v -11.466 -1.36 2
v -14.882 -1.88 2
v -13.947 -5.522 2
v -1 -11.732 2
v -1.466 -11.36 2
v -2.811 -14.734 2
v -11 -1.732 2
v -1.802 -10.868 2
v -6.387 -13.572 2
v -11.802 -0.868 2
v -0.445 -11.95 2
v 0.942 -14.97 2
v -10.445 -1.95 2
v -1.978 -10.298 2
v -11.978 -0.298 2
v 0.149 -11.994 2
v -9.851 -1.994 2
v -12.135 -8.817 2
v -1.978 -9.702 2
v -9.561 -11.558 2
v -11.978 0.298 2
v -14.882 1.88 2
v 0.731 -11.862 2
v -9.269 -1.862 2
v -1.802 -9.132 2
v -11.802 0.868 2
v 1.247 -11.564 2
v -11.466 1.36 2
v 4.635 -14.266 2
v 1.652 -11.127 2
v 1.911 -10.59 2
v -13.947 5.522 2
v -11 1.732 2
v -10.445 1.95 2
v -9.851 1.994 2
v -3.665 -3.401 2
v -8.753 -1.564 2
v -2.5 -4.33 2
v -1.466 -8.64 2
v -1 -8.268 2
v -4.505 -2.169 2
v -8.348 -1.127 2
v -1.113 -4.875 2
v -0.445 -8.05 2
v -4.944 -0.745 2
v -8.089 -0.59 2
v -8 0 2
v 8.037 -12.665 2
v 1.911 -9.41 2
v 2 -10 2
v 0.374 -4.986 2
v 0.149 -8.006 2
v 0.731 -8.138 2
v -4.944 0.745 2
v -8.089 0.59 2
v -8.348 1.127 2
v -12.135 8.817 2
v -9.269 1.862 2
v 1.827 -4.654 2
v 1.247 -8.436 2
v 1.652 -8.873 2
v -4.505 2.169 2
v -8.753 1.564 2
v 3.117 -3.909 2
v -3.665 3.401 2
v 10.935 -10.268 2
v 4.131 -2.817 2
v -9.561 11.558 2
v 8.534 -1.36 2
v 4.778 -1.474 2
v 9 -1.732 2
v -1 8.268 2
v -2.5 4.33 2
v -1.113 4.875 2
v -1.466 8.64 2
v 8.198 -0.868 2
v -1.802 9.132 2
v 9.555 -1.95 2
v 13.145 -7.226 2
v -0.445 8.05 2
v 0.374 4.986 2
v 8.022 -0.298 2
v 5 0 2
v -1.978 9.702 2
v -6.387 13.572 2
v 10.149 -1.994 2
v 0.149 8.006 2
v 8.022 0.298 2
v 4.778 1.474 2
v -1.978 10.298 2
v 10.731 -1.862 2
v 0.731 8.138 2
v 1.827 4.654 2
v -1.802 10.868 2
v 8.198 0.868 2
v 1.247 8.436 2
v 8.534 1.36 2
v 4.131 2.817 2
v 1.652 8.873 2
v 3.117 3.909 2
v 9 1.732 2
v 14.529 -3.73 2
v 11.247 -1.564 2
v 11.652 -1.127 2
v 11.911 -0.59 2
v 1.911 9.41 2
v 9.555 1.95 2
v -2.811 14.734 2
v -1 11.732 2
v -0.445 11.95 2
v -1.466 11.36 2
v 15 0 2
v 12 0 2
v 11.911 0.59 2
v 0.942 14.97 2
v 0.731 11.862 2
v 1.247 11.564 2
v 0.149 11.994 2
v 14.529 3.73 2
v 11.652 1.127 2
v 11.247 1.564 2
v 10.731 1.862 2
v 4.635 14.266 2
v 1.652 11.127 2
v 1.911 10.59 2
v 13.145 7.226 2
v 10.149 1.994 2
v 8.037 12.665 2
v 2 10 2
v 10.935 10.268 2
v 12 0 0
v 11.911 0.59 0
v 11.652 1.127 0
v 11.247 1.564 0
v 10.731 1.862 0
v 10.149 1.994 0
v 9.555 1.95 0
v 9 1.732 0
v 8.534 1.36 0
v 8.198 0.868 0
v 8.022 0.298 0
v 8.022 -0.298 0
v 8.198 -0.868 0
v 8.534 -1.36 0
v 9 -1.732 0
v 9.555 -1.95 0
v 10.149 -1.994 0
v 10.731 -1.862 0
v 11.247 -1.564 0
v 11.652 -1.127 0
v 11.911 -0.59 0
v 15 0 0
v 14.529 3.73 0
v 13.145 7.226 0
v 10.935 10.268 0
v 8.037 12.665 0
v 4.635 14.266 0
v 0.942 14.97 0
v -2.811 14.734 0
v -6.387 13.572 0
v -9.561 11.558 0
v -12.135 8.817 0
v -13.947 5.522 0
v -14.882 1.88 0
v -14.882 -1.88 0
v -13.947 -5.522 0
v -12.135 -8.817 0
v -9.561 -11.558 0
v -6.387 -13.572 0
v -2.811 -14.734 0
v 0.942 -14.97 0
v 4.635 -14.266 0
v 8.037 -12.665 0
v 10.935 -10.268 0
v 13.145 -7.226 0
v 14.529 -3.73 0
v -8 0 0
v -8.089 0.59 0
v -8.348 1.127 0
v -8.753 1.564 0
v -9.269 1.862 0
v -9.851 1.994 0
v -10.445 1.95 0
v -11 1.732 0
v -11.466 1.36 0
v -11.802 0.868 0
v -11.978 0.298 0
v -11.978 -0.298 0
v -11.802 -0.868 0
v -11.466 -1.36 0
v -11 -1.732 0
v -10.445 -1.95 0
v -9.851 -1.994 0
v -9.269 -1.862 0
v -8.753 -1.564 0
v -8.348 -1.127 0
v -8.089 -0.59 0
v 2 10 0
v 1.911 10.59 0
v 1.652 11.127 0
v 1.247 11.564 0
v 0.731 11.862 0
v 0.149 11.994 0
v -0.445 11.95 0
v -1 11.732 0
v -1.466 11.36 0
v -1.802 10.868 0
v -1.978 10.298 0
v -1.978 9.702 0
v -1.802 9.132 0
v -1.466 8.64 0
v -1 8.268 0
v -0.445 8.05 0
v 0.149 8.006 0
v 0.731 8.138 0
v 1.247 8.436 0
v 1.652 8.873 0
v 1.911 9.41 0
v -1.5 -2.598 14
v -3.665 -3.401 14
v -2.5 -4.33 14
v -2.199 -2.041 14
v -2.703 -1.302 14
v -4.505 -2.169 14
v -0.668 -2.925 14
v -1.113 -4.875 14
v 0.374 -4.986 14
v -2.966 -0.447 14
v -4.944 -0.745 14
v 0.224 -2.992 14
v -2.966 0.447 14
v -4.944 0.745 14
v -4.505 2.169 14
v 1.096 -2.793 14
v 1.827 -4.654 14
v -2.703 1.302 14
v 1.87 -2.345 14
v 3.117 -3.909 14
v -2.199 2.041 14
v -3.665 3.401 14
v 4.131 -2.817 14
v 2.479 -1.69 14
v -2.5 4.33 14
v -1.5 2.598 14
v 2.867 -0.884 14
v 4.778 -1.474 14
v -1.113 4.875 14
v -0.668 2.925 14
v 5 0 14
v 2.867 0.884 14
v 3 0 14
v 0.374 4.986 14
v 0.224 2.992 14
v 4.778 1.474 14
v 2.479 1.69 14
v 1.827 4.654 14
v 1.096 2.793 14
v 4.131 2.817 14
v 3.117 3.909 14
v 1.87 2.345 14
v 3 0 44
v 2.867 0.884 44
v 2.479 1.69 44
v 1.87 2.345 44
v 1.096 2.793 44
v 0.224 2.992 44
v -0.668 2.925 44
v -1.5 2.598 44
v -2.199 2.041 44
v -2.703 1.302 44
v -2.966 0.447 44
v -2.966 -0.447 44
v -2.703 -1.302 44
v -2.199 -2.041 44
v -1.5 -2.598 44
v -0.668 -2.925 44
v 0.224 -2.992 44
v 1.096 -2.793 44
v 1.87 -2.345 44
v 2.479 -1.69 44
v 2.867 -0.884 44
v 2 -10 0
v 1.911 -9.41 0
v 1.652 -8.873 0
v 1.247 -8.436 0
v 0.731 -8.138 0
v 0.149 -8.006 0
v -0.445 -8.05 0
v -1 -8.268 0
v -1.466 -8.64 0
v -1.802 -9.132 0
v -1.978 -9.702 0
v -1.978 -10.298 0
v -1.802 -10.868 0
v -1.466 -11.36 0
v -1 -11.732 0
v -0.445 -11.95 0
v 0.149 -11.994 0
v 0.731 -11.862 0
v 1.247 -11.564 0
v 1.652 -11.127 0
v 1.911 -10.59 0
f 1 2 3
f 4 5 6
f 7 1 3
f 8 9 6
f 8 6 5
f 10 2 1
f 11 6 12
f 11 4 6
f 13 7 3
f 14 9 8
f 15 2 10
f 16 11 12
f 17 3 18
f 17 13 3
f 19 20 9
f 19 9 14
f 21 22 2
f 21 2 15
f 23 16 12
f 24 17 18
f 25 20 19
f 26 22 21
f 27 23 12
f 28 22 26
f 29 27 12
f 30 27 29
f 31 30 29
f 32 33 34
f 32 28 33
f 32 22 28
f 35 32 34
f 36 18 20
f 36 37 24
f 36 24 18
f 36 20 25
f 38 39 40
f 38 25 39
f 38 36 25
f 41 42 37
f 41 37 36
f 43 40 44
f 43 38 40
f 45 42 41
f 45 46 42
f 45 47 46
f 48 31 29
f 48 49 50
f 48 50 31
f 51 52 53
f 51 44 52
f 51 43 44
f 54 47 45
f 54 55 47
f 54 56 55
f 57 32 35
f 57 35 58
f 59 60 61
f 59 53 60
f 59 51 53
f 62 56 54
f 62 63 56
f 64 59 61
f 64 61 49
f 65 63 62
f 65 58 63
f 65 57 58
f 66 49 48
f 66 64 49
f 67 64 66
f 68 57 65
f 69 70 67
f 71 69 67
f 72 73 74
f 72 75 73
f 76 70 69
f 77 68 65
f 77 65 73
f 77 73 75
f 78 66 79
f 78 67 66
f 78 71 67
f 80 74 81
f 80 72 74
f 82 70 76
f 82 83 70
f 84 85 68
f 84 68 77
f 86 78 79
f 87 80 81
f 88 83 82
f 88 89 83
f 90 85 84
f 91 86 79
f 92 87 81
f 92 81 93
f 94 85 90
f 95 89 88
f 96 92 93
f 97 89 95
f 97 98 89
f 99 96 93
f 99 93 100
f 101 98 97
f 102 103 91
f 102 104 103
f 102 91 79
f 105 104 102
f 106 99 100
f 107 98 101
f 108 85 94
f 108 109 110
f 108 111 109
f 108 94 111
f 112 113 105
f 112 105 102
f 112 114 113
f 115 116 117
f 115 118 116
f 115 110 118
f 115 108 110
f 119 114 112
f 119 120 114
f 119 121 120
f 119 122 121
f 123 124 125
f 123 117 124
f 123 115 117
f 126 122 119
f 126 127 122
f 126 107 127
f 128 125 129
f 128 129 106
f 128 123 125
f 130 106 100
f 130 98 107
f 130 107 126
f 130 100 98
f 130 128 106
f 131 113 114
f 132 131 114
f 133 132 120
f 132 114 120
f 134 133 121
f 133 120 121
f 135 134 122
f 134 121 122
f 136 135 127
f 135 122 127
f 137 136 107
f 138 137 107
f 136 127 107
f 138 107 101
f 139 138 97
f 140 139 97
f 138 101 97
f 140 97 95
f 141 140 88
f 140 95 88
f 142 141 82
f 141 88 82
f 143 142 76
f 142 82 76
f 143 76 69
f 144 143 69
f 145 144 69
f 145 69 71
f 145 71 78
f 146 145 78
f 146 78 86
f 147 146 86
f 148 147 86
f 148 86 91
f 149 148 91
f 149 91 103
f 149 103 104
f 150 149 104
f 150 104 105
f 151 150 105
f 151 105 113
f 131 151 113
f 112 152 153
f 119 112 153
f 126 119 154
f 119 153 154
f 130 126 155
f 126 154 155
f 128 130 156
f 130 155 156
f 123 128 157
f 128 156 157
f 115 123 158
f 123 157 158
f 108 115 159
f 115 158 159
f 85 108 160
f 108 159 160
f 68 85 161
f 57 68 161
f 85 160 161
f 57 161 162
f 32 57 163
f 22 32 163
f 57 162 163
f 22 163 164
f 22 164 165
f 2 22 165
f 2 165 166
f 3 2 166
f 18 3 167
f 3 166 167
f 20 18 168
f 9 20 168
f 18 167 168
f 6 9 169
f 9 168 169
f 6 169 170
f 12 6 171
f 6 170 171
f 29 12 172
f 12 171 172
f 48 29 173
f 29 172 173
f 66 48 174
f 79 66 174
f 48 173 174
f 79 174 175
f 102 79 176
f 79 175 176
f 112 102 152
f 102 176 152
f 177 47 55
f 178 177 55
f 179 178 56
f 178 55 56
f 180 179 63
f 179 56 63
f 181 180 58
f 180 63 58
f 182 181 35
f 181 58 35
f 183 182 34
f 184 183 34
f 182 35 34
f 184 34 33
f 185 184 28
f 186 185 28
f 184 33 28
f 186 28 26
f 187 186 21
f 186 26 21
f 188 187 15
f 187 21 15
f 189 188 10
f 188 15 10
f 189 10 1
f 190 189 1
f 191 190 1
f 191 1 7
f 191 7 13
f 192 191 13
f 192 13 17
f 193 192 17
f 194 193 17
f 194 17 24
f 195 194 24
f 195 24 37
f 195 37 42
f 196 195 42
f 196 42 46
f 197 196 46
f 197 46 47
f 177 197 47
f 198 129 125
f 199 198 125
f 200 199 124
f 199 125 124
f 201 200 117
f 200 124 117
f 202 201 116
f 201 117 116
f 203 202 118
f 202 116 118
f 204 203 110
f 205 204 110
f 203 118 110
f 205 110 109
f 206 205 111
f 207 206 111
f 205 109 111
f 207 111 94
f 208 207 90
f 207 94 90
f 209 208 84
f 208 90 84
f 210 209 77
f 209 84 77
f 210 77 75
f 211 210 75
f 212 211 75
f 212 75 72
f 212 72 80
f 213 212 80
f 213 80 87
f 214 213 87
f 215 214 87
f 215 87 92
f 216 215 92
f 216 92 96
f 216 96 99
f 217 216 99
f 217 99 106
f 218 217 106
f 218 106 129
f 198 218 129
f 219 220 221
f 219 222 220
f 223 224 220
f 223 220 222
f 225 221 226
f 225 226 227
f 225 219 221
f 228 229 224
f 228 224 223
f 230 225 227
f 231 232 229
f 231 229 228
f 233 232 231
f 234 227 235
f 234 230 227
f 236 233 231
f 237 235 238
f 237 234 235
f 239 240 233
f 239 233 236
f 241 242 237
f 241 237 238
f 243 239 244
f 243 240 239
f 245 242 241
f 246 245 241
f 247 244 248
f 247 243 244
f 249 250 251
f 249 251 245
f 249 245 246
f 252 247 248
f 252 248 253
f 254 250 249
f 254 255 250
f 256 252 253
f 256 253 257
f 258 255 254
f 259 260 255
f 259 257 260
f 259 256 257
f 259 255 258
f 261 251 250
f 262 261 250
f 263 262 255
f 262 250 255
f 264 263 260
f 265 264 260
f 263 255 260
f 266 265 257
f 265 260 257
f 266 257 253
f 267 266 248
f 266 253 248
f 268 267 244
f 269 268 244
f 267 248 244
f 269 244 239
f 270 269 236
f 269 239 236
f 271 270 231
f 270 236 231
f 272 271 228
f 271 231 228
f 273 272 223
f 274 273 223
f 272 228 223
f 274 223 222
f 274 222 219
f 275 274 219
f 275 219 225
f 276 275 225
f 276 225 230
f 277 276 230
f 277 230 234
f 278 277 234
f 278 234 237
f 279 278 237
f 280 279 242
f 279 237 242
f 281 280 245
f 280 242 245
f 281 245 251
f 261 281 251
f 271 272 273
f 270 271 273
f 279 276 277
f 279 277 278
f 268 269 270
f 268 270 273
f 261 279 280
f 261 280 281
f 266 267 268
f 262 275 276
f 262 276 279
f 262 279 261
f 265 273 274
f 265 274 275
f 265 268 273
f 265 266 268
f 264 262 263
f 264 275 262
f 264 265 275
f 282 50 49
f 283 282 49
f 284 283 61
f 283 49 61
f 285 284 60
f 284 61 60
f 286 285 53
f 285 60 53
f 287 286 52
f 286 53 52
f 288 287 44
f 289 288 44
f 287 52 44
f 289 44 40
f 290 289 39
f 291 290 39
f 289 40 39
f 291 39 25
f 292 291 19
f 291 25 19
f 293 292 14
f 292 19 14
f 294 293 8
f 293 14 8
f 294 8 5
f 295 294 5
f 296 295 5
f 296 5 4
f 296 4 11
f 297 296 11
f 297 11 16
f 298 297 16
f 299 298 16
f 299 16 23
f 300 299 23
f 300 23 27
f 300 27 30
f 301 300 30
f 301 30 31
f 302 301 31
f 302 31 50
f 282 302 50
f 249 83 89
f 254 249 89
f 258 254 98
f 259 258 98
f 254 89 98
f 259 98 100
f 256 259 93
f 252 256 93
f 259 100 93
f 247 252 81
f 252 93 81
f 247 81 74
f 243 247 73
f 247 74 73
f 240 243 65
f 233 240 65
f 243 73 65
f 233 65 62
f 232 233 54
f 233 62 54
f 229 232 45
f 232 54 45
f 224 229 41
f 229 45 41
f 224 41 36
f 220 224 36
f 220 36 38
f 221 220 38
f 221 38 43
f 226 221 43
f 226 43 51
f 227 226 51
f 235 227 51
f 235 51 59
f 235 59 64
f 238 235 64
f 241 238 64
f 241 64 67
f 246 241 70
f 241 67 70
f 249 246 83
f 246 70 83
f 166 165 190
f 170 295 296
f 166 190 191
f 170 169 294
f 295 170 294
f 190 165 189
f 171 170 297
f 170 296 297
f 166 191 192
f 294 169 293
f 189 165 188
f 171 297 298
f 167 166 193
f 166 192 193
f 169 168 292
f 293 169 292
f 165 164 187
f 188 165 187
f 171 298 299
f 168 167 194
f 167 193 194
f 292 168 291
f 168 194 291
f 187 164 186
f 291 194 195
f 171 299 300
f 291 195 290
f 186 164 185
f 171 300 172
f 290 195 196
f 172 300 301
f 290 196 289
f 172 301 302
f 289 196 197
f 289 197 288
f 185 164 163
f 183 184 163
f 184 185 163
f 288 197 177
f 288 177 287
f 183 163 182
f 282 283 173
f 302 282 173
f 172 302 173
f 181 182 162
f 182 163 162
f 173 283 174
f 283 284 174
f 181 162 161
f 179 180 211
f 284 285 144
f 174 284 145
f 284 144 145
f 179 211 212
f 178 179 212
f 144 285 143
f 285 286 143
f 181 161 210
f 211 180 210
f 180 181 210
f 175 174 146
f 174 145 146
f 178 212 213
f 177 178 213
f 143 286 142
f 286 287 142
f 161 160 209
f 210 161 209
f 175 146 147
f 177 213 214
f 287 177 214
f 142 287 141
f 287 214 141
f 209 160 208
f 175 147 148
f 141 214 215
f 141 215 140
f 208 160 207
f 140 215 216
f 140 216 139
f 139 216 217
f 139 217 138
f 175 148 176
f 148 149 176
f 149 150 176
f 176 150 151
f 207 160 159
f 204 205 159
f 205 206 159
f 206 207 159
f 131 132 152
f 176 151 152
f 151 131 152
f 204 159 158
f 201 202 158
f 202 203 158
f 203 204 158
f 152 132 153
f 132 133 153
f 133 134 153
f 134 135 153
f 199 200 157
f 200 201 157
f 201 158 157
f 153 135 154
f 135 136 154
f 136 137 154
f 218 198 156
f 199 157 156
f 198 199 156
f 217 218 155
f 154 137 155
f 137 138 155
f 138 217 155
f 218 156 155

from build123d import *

# Parameters (mm, degrees)
SKETCH1_R           = 15
BOSS_EXTRUDE1_DEPTH = 2
SKETCH2_R           = 5
BOSS_EXTRUDE2_DEPTH = 12
SKETCH3_R           = 2
CUT_EXTRUDE1_DEPTH  = 6
SKETCH4_R           = 3
BOSS_EXTRUDE3_DEPTH = 30


with BuildPart() as part:
    # Sketch1 → Boss-Extrude1 (new body)
    with BuildSketch(Plane.XY):
        Circle(SKETCH1_R)
    extrude(amount=BOSS_EXTRUDE1_DEPTH)

    # Sketch2 → Boss-Extrude2 (add)
    with BuildSketch(Plane.XY.offset(2)):
        Circle(SKETCH2_R)
    extrude(amount=BOSS_EXTRUDE2_DEPTH)

    # Sketch3 → Cut-Extrude1 (cut)
    with BuildSketch(Plane.XY.offset(2)):
        with Locations((0, 10)):
            Circle(SKETCH3_R)
        with Locations((10, 0)):
            Circle(SKETCH3_R)
        with Locations((0, -10)):
            Circle(SKETCH3_R)
        with Locations((-10, 0)):
            Circle(SKETCH3_R)
    extrude(amount=-CUT_EXTRUDE1_DEPTH, mode=Mode.SUBTRACT)

    # Sketch4 → Boss-Extrude3 (add)
    with BuildSketch(Plane.XY.offset(14)):
        Circle(SKETCH4_R)
    extrude(amount=BOSS_EXTRUDE3_DEPTH)


solid = part.part
